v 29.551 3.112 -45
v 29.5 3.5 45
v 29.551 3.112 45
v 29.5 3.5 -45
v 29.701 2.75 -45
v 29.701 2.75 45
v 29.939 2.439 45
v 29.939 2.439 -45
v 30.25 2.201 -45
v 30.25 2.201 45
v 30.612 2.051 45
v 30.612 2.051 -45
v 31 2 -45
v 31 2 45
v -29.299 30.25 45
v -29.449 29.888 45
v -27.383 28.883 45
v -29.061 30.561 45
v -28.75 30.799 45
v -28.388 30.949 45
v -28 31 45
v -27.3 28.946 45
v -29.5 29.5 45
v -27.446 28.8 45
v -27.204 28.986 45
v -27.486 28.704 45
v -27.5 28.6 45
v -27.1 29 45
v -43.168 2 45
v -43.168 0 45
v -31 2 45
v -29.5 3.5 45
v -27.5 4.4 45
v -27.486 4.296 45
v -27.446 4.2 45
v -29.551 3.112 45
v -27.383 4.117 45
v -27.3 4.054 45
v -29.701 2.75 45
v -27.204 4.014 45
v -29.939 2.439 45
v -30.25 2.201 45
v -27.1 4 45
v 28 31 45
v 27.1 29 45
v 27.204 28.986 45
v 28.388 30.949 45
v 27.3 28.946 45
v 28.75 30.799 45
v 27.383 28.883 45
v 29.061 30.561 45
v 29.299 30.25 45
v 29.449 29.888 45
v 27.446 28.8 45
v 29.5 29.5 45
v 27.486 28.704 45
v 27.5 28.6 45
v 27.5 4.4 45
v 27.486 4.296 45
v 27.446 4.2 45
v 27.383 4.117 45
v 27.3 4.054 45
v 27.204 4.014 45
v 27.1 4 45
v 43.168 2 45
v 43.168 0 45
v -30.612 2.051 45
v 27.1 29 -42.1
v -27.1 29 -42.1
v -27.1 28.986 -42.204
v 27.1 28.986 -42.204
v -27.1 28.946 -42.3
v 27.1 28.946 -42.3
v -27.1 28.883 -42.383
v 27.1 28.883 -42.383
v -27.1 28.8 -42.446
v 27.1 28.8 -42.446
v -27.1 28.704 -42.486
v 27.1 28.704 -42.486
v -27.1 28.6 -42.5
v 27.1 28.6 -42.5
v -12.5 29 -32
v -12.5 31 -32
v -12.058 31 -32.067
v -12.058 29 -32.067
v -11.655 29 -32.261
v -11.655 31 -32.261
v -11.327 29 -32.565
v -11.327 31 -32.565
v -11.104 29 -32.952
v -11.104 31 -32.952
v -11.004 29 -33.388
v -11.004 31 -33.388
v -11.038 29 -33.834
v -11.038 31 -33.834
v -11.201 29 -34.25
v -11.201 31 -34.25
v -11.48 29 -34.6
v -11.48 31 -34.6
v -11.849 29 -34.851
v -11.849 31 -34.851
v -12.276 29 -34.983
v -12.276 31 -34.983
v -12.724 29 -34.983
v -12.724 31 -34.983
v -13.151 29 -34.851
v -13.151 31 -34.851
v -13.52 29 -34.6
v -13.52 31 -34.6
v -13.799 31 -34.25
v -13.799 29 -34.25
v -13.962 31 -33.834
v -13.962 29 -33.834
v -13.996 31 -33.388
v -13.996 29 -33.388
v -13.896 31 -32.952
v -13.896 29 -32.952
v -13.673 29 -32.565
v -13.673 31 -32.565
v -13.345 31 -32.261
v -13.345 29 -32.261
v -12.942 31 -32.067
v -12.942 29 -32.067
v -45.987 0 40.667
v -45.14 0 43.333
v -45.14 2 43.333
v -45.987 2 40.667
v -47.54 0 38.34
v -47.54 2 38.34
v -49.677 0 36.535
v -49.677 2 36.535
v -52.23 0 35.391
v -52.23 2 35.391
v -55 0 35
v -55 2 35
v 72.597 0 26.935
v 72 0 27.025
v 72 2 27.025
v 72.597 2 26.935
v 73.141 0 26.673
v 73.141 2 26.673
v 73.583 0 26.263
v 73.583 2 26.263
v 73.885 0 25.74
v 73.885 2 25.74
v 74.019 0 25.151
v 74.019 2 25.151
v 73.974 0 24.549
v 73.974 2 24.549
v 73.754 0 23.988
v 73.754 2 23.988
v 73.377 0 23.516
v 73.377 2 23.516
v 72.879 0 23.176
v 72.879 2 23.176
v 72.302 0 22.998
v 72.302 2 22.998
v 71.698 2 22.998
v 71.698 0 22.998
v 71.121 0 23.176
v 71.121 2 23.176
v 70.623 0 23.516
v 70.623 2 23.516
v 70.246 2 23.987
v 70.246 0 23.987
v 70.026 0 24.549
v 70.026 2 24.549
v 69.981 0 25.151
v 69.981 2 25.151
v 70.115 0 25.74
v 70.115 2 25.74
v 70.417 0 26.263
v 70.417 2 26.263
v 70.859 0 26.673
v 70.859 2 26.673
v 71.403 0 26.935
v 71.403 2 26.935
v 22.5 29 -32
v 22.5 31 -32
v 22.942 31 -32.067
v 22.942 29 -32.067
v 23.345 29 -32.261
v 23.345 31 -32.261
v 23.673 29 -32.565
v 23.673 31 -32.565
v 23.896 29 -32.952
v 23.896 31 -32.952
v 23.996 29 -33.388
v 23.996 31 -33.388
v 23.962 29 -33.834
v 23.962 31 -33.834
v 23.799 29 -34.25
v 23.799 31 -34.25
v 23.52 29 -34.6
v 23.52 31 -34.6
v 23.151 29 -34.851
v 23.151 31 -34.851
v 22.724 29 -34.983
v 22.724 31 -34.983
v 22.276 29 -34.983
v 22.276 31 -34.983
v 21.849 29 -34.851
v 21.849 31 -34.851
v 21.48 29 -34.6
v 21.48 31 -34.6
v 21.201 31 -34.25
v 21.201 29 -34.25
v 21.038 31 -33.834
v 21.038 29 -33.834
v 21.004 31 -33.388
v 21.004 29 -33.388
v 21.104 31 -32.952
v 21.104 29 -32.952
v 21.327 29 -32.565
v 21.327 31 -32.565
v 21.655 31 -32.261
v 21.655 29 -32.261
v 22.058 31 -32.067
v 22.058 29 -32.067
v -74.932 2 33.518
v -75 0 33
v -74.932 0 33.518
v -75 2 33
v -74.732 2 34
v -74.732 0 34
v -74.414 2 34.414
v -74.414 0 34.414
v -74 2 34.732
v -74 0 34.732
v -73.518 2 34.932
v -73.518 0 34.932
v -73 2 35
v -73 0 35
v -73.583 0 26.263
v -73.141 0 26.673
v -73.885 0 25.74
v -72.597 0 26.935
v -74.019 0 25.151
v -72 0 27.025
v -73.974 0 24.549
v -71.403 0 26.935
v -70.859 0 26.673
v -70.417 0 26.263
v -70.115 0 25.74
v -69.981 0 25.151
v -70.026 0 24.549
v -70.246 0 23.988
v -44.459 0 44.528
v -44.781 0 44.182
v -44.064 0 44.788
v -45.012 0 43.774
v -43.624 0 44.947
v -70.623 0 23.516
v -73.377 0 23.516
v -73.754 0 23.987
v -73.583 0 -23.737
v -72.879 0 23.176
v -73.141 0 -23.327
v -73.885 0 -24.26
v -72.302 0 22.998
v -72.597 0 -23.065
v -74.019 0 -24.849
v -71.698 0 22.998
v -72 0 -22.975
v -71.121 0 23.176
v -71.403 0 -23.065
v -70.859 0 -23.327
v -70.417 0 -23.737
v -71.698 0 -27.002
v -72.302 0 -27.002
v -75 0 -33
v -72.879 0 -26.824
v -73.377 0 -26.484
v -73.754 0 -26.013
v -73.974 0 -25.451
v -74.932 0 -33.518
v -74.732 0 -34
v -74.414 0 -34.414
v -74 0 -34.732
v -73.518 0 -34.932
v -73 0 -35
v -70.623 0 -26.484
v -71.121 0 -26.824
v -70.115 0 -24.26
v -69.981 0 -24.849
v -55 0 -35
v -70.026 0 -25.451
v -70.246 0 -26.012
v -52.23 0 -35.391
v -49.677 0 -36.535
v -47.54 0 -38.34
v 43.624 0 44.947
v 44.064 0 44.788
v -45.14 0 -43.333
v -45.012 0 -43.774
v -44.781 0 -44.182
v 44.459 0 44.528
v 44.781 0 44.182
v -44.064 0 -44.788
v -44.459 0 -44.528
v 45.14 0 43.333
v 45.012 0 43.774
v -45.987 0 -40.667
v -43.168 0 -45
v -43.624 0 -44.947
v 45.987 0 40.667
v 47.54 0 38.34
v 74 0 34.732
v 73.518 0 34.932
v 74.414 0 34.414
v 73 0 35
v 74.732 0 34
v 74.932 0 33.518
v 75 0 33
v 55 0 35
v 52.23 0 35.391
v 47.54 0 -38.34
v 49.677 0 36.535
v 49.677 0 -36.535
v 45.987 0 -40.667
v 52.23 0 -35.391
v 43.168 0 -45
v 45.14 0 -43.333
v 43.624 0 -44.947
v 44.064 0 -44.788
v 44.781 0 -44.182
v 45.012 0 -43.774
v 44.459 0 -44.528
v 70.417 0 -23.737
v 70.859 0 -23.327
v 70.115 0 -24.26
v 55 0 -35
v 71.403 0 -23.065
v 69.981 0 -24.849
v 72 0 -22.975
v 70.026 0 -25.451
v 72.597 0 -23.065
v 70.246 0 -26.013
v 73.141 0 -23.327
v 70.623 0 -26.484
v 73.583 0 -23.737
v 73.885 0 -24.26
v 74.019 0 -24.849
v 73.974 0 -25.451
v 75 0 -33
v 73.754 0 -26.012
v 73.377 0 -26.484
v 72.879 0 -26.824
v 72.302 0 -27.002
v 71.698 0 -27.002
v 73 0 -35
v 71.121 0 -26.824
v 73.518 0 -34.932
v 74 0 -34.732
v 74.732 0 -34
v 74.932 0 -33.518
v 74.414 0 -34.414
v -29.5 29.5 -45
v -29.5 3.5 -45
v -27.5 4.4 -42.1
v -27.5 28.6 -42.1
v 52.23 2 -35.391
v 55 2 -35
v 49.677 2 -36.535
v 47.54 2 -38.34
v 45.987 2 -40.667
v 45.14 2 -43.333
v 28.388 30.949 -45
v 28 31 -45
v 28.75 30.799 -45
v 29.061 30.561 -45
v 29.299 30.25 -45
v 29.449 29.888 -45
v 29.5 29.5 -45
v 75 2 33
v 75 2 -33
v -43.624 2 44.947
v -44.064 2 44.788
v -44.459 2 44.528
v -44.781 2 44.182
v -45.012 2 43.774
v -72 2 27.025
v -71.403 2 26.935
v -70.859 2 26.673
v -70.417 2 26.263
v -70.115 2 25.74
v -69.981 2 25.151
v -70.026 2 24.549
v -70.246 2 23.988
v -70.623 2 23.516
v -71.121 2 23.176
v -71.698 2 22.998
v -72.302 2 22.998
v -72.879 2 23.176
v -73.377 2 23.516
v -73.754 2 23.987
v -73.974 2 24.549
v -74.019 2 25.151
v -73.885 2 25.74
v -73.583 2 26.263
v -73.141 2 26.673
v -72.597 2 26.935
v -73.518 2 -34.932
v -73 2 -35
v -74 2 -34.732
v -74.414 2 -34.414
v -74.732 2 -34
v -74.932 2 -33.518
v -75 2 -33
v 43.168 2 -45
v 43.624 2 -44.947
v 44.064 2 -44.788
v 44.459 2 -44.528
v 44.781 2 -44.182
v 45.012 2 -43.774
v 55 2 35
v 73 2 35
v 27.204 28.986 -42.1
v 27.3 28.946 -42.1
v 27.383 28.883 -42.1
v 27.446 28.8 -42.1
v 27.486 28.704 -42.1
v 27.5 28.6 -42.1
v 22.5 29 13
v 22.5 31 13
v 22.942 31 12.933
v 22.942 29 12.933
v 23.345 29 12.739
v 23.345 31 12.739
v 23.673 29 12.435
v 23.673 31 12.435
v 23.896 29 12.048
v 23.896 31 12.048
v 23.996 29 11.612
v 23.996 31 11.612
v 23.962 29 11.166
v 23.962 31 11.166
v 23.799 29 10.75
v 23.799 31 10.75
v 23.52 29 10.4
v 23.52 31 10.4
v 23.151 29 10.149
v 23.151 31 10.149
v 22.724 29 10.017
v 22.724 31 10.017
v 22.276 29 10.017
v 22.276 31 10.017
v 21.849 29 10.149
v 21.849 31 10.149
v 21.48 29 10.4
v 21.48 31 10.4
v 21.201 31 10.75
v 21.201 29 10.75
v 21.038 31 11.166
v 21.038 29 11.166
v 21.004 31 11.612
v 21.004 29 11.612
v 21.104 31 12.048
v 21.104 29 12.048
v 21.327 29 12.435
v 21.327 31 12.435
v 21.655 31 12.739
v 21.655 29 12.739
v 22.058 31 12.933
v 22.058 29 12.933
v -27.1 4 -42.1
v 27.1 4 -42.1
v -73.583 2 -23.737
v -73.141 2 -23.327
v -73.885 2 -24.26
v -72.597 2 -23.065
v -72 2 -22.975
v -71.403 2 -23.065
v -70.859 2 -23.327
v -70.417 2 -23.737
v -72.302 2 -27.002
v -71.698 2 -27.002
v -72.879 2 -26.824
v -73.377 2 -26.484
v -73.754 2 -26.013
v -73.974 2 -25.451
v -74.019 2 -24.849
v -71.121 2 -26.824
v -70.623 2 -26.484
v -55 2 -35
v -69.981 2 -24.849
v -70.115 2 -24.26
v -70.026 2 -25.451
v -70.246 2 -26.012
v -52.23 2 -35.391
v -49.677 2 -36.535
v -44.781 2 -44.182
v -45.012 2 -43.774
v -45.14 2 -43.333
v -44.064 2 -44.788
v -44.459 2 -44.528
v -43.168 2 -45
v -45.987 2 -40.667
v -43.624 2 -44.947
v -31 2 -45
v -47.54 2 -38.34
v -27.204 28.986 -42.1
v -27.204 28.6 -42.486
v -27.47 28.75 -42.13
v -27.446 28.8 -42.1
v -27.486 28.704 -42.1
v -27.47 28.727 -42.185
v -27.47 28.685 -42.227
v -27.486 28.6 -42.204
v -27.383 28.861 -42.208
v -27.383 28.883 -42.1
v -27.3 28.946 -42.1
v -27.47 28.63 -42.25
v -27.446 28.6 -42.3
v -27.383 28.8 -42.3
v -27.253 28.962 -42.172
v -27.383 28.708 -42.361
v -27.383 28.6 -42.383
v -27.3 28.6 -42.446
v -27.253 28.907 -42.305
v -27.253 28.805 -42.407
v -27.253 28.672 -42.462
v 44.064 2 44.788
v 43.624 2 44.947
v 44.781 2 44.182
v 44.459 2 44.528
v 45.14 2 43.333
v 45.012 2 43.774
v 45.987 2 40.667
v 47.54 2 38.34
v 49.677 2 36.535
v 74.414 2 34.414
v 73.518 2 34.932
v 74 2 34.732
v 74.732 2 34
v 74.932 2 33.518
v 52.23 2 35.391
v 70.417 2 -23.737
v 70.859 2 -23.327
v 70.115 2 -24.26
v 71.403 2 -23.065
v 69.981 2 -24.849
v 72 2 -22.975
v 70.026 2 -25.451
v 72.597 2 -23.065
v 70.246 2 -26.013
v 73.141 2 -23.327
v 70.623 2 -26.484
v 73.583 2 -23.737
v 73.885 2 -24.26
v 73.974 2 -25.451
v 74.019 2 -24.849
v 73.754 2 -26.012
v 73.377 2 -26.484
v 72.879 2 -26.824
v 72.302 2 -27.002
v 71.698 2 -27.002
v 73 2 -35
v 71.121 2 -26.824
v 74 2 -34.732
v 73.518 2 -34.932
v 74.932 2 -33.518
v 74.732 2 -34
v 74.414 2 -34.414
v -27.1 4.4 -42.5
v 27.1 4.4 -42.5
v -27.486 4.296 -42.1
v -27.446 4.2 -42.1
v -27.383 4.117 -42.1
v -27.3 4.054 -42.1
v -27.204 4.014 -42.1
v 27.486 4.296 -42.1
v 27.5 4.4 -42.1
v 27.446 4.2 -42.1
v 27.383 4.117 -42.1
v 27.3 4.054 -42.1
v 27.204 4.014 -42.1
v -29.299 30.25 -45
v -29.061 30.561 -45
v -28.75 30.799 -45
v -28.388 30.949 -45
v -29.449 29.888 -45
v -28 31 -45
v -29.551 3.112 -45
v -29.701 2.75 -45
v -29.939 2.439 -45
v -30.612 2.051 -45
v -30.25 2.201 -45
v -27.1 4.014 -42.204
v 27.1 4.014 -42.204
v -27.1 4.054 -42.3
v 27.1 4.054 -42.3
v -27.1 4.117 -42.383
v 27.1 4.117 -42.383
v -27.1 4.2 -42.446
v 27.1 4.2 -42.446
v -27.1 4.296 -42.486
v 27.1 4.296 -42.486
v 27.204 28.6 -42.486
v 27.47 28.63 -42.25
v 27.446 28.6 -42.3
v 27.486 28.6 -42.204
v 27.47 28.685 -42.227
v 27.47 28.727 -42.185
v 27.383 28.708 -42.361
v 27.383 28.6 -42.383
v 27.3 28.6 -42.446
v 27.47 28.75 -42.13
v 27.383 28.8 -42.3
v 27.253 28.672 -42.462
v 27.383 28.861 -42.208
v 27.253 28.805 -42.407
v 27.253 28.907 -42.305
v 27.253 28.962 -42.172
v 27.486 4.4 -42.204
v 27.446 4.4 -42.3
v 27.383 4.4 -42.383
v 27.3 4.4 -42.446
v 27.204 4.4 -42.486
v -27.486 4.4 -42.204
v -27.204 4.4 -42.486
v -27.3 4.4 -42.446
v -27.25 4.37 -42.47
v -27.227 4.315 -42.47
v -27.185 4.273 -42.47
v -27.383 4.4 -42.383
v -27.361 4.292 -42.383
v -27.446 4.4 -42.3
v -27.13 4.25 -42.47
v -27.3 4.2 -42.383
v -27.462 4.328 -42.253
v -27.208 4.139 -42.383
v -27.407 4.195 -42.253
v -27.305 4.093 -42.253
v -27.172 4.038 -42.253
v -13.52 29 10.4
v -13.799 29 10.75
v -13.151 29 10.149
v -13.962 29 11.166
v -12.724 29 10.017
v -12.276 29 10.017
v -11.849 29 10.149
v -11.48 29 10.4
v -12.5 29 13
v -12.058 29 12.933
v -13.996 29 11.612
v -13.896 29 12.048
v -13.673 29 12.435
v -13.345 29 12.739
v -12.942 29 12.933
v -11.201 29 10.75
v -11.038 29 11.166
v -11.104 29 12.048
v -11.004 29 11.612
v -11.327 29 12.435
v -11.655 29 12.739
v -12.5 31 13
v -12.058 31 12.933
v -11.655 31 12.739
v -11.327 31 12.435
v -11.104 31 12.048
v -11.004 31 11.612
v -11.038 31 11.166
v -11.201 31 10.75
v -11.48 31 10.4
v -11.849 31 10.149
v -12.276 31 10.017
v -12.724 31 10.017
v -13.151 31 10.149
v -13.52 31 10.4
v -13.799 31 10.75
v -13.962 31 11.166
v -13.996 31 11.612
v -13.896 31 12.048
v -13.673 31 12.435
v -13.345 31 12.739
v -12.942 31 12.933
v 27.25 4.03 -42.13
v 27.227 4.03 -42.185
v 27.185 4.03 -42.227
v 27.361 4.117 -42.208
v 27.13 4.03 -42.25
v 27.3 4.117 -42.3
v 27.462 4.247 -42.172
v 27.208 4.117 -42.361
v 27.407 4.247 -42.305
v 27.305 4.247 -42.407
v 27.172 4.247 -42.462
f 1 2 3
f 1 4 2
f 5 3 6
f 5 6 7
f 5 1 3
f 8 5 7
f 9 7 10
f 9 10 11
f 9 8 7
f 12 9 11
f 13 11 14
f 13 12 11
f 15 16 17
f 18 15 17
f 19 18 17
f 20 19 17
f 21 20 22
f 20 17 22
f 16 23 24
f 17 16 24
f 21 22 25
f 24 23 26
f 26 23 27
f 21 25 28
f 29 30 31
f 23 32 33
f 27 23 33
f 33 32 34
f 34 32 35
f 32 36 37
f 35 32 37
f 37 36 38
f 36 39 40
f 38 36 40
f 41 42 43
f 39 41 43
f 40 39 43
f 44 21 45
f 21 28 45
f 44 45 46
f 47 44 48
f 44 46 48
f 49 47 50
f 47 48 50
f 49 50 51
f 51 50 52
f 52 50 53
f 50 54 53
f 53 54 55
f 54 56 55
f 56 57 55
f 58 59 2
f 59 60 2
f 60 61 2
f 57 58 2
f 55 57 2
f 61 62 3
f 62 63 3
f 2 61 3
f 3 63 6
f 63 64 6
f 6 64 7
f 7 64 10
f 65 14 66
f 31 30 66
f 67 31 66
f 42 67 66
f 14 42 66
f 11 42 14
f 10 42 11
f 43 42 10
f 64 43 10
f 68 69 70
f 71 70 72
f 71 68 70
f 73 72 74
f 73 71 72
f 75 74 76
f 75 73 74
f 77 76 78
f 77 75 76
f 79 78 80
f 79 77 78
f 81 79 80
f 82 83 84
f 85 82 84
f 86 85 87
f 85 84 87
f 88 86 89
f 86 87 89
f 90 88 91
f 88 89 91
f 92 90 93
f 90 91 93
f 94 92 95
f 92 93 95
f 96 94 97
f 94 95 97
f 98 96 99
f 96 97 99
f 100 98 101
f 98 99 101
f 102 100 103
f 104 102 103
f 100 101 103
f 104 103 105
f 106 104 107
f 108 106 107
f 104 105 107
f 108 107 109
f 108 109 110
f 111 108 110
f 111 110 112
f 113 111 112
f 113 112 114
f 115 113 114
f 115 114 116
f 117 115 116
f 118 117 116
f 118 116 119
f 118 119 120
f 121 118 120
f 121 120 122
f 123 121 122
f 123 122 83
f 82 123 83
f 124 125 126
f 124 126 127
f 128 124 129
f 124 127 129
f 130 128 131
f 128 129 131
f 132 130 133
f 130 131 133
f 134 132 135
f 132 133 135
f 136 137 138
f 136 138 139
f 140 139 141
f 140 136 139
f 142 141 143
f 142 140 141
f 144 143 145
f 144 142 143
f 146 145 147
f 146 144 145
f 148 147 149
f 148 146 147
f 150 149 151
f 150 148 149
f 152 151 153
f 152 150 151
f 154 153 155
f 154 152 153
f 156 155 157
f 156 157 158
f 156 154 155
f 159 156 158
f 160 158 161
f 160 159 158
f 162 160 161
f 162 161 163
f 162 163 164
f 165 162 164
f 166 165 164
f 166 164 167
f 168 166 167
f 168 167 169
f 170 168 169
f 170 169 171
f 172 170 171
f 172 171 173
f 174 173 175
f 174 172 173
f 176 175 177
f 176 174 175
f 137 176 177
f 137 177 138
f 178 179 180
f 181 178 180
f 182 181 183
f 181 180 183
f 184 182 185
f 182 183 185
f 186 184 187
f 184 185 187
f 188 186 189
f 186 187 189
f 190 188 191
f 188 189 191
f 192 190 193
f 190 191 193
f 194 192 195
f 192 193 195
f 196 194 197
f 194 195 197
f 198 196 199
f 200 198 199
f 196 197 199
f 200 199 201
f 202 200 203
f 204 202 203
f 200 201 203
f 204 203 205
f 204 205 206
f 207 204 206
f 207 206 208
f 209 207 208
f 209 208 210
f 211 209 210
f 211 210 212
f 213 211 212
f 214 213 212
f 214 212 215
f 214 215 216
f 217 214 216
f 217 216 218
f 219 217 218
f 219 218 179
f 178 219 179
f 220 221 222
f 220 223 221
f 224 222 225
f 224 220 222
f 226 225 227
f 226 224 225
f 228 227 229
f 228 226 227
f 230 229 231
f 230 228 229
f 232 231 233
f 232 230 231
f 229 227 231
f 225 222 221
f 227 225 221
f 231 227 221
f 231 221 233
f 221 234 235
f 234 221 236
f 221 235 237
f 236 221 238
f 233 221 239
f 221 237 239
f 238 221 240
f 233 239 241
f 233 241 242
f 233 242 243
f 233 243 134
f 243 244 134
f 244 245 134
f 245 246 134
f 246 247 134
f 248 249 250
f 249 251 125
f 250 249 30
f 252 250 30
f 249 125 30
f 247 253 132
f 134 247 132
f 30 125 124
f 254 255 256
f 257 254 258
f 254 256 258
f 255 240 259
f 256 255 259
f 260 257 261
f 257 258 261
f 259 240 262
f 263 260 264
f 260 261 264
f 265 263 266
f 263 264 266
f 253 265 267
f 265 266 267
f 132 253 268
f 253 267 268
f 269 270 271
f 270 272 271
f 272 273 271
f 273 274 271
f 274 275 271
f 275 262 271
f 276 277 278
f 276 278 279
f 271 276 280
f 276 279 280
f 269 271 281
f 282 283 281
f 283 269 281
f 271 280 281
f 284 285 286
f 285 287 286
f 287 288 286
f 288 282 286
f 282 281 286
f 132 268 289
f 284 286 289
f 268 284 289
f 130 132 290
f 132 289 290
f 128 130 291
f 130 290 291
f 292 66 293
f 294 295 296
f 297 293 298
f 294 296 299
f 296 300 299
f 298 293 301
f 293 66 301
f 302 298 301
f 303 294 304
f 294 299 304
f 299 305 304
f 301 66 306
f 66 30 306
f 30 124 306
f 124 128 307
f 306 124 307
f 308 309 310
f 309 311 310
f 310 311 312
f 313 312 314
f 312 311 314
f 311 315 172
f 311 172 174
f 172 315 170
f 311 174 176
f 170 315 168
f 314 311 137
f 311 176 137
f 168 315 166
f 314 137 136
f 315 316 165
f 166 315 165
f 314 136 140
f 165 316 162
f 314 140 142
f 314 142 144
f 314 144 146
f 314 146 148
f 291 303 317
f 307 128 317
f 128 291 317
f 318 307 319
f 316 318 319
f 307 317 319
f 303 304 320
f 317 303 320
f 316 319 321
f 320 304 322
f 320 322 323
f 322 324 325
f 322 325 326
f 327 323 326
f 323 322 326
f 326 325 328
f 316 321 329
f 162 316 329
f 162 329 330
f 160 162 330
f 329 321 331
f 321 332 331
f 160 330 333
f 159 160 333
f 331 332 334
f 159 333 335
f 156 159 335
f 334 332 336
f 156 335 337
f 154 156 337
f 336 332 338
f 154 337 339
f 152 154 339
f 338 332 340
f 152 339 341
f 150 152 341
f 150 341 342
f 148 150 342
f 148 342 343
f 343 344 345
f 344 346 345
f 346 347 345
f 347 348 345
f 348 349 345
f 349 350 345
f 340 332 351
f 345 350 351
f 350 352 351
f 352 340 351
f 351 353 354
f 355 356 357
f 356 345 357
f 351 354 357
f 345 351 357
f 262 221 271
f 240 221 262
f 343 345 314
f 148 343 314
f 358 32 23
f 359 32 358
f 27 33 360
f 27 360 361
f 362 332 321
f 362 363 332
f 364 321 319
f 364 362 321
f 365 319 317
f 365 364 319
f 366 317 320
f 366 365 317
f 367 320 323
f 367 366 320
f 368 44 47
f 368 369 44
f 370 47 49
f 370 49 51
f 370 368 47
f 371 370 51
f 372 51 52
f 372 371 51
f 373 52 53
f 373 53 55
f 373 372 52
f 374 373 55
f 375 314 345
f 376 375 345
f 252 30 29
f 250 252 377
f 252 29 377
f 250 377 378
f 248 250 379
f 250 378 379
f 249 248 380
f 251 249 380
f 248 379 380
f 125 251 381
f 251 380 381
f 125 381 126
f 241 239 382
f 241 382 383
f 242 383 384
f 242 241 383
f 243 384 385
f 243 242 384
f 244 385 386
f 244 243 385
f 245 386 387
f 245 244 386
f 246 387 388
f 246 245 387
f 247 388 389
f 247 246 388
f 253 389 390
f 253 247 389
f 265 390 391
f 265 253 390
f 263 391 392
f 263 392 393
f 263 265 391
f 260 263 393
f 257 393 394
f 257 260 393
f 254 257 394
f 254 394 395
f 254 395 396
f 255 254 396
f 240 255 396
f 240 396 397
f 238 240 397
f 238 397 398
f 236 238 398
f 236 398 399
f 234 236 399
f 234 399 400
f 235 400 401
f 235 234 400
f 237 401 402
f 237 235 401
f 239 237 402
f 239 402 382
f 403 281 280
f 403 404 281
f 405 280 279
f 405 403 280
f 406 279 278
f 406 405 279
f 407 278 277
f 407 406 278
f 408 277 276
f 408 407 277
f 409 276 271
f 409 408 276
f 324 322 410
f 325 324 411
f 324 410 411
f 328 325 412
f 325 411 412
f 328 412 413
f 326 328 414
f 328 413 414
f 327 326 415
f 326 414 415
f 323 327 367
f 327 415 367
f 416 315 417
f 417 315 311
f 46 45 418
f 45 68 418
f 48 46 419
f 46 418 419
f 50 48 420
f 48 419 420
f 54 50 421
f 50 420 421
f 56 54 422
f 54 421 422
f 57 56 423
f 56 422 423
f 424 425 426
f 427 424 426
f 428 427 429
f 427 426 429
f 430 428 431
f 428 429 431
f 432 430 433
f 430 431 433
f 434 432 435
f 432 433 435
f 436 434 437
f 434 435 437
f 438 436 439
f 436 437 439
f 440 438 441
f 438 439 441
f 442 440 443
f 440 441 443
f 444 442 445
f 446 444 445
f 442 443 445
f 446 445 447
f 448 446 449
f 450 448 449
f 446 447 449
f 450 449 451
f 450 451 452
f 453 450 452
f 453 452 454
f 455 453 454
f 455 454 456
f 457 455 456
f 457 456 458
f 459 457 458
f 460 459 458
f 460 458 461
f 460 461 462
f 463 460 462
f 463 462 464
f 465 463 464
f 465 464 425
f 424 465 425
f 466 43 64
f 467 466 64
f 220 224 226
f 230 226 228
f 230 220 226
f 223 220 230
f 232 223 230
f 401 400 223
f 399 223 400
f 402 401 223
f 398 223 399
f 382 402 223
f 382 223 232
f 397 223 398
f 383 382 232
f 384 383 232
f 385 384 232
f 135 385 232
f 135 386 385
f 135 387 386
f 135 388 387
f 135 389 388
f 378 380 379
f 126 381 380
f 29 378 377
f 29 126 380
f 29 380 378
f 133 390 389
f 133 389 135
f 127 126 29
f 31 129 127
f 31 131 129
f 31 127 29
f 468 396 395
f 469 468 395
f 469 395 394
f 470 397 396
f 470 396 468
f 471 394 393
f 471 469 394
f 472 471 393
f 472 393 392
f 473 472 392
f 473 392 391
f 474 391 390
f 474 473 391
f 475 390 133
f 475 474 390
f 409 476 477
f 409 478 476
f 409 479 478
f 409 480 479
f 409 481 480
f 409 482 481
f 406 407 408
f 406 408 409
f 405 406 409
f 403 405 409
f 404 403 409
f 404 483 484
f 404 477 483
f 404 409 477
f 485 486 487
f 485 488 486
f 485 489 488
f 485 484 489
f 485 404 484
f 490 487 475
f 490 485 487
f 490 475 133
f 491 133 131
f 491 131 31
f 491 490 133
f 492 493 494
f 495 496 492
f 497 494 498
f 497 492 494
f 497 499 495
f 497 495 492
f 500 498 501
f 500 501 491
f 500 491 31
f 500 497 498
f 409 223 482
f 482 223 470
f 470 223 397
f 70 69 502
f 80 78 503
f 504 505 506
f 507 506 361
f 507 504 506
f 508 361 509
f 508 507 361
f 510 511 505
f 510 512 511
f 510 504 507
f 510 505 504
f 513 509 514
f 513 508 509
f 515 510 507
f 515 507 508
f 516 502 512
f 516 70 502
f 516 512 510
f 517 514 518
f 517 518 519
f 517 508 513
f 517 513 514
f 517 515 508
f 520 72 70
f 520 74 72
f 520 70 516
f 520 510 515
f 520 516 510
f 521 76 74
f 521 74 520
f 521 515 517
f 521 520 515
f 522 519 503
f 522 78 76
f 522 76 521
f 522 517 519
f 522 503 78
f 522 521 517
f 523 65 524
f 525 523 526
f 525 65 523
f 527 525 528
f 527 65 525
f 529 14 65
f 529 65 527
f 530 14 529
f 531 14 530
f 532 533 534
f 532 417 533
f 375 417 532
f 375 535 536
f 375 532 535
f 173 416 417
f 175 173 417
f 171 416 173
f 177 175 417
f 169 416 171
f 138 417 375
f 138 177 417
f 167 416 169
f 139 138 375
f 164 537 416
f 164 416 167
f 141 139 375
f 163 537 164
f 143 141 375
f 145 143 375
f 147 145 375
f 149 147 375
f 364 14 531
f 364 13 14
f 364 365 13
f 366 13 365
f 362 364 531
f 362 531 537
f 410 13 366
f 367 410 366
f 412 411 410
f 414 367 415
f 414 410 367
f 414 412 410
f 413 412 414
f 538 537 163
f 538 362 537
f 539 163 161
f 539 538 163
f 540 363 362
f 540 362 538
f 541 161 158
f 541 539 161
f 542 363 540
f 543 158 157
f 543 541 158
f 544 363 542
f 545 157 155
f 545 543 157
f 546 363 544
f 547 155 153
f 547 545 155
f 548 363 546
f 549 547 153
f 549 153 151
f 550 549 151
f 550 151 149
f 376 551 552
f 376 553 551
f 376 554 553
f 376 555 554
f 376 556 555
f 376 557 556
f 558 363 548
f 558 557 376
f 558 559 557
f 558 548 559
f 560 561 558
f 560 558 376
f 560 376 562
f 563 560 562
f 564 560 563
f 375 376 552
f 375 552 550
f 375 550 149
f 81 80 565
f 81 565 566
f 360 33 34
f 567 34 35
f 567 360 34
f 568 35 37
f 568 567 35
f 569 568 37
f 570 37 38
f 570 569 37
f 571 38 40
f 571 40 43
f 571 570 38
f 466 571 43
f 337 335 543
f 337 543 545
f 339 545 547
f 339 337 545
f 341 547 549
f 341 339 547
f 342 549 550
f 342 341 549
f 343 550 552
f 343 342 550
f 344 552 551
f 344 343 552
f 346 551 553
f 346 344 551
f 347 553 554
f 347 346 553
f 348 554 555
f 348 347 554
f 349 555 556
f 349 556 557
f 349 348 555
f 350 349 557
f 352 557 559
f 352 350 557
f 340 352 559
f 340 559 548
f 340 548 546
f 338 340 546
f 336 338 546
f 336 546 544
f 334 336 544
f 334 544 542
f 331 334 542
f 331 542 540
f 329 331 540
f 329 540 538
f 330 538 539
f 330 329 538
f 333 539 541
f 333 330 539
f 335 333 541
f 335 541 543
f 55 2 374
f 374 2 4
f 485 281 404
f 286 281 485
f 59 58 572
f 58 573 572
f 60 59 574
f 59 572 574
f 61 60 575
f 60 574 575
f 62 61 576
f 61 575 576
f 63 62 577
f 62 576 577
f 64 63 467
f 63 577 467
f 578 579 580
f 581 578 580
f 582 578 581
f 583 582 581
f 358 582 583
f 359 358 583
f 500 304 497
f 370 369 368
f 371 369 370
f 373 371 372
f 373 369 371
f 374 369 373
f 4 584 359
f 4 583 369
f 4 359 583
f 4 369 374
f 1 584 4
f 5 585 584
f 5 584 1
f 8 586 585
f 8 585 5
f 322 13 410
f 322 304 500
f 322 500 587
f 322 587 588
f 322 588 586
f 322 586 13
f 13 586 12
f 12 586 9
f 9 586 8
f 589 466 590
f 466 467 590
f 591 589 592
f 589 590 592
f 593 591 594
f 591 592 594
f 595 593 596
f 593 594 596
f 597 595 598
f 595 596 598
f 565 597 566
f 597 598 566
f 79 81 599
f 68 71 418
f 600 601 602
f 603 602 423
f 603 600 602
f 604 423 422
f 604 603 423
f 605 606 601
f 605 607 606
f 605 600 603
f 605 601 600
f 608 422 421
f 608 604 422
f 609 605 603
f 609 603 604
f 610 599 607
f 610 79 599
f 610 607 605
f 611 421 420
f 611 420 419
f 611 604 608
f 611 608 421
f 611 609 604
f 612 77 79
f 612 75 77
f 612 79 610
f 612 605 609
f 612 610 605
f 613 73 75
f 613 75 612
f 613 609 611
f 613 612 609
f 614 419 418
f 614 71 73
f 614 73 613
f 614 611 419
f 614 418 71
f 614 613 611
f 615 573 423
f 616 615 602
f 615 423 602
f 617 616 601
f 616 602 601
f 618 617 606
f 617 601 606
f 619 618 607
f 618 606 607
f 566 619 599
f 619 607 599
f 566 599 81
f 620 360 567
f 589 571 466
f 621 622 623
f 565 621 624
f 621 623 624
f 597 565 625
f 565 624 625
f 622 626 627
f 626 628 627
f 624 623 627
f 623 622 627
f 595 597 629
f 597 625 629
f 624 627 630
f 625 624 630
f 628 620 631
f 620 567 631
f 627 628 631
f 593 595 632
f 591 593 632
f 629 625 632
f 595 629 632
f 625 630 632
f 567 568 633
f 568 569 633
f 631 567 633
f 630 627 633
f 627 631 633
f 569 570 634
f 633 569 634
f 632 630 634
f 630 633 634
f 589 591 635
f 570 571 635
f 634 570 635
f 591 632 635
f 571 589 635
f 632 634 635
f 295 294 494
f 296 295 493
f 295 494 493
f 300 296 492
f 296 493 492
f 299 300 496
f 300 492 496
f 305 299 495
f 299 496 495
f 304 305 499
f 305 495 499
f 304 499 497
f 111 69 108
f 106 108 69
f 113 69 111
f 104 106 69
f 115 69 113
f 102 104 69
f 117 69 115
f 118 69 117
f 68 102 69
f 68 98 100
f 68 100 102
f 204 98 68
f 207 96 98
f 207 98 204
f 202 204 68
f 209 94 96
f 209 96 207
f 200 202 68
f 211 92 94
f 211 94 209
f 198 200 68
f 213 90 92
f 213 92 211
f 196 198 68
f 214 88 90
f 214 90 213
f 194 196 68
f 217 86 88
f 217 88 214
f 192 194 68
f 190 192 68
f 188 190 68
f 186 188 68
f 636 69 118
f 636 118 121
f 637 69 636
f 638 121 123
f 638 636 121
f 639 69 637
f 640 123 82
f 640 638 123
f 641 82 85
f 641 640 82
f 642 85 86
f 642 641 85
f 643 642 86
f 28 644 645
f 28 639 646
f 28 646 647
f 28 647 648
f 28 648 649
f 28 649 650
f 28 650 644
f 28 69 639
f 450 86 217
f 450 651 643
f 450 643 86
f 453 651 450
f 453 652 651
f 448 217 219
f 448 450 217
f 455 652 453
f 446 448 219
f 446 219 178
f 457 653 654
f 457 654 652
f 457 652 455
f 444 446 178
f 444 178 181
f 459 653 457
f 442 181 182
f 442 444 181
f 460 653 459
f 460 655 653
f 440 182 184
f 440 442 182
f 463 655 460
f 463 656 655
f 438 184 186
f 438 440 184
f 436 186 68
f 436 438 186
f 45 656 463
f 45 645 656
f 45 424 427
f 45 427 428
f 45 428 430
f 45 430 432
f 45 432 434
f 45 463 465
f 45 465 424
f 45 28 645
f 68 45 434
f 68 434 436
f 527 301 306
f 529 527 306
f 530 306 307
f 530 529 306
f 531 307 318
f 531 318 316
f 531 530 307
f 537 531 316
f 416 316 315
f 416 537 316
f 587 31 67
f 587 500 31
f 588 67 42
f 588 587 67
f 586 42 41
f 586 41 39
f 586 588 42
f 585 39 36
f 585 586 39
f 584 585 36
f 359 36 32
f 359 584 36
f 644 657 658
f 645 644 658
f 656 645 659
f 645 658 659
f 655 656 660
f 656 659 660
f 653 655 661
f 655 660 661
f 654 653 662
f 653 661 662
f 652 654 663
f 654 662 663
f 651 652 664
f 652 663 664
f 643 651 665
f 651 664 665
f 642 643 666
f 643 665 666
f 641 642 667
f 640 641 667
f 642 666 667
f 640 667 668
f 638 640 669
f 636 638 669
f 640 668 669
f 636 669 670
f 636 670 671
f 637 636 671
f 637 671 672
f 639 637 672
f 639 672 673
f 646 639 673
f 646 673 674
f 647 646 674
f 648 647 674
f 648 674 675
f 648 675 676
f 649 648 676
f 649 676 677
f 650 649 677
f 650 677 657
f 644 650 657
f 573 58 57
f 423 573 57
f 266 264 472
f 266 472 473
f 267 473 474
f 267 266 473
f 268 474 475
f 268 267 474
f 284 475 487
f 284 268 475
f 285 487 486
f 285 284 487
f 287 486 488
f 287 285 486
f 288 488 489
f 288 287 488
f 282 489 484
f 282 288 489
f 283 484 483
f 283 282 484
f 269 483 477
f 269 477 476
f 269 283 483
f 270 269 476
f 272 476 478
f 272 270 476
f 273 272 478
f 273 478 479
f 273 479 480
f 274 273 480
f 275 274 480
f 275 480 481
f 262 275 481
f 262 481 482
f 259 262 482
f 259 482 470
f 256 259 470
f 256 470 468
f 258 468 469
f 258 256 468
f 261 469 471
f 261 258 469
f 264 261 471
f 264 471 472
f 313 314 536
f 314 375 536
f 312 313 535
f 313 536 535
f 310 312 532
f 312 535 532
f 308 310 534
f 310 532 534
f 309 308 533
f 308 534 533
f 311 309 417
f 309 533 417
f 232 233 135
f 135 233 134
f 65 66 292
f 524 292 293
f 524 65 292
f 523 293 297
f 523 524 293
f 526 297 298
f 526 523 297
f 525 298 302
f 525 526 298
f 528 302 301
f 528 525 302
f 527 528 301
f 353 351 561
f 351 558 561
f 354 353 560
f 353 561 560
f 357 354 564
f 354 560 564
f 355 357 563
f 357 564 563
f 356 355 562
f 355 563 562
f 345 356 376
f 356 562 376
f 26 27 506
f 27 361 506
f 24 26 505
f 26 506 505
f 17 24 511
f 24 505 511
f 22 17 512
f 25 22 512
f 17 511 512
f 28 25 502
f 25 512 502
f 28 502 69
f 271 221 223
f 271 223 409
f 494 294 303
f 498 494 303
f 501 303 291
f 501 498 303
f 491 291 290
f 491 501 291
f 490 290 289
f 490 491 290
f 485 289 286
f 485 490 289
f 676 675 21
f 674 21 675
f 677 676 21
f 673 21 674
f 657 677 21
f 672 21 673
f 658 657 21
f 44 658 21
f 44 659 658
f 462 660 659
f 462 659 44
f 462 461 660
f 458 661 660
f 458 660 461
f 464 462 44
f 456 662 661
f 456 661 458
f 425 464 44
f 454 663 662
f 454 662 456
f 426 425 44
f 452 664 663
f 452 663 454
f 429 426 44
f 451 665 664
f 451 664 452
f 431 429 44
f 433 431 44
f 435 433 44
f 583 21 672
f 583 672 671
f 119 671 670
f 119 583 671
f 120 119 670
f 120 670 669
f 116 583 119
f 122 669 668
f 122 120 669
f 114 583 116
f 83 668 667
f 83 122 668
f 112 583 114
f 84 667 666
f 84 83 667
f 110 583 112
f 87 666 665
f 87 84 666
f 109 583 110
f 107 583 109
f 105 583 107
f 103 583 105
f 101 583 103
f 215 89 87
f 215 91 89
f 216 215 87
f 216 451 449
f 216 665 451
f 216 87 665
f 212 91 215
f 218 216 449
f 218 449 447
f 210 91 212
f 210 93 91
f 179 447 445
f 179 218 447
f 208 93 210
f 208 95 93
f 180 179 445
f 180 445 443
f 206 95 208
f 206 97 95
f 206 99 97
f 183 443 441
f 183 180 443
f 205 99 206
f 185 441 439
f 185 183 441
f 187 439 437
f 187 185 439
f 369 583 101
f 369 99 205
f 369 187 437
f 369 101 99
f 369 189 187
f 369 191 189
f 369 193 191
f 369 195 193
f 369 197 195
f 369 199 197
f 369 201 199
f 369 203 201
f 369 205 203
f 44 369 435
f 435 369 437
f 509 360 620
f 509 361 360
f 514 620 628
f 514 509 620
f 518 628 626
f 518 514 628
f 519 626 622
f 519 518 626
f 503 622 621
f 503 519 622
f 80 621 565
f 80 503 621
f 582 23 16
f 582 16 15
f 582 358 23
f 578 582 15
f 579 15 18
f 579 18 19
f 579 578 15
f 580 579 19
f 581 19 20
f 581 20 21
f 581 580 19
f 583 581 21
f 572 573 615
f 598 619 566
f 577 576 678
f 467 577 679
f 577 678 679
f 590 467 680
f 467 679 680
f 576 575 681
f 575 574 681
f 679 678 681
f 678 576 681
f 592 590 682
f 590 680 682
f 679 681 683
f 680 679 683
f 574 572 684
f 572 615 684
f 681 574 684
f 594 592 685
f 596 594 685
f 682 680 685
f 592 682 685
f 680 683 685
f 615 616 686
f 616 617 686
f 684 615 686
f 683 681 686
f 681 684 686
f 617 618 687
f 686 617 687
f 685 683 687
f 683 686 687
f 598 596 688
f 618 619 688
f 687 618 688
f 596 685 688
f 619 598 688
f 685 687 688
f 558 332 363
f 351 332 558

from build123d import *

# Parameters (mm, degrees)
SKETCH1_W           = 90
SKETCH1_H           = 70
SKETCH1_W_2         = 30
SKETCH1_R           = 2.025
SKETCH1_H_2         = 10
BOSS_EXTRUDE1_DEPTH = 2
SKETCH2_W           = 59
SKETCH2_H           = 90
BOSS_EXTRUDE2_DEPTH = 29
SKETCH4_W           = 55
SKETCH4_H           = 25
CUT_EXTRUDE1_DEPTH  = 87.5
FILLET1_R           = 1.5
FILLET2_R           = 0.4
FILLET3_R           = 10
FILLET7_R           = 2
SKETCH7_R           = 1.5
CUT_EXTRUDE2_DEPTH  = 5


with BuildPart() as part:
    # Sketch1 → Boss-Extrude1 (new body)
    # profile 1 of 5: a face of its own
    with BuildSketch(Plane(origin=(0, 0, 0), x_dir=(1, 0, 0), z_dir=(0, 1, 0))):
        Rectangle(SKETCH1_W, SKETCH1_H)
    # profile 2 of 5: a face of its own
    with BuildSketch(Plane(origin=(0, 0, 0), x_dir=(1, 0, 0), z_dir=(0, 1, 0))):
        with Locations((-60, 0)):
            Rectangle(SKETCH1_W_2, SKETCH1_H)
        with Locations(Location((-72, -25, 0), (0, 0, 270))):
            Circle(SKETCH1_R, mode=Mode.SUBTRACT)
        with Locations(Location((-72, 25, 0), (0, 0, 270))):
            Circle(SKETCH1_R, mode=Mode.SUBTRACT)
    # profile 3 of 5: a face of its own
    with BuildSketch(Plane(origin=(0, 0, 0), x_dir=(1, 0, 0), z_dir=(0, 1, 0))):
        with Locations((60, 0)):
            Rectangle(SKETCH1_W_2, SKETCH1_H)
        with Locations(Location((72, -25, 0), (0, 0, 270))):
            Circle(SKETCH1_R, mode=Mode.SUBTRACT)
        with Locations(Location((72, 25, 0), (0, 0, 270))):
            Circle(SKETCH1_R, mode=Mode.SUBTRACT)
    # profile 4 of 5: a face of its own
    with BuildSketch(Plane(origin=(0, 0, 0), x_dir=(1, 0, 0), z_dir=(0, 1, 0))):
        with Locations((0, -40)):
            Rectangle(SKETCH1_W, SKETCH1_H_2)
    # profile 5 of 5: a face of its own
    with BuildSketch(Plane(origin=(0, 0, 0), x_dir=(1, 0, 0), z_dir=(0, 1, 0))):
        with Locations((0, 40)):
            Rectangle(SKETCH1_W, SKETCH1_H_2)
    extrude(amount=BOSS_EXTRUDE1_DEPTH)

    # Sketch2 → Boss-Extrude2 (add)
    with BuildSketch(Plane(origin=(0, 2, 0), x_dir=(1, 0, 0), z_dir=(0, 1, 0))):
        Rectangle(SKETCH2_W, SKETCH2_H)
    extrude(amount=BOSS_EXTRUDE2_DEPTH)

    # Sketch4 → Cut-Extrude1 (cut)
    with BuildSketch(Plane.XY.offset(45)):
        with Locations((0, 16.5)):
            Rectangle(SKETCH4_W, SKETCH4_H)
    extrude(amount=-CUT_EXTRUDE1_DEPTH, mode=Mode.SUBTRACT)

    # Fillet1
    fillet1_edges = [part.edges().sort_by_distance(p)[0] for p in [
        (-29.5, 2, 0),
        (29.5, 2, 0),
        (-29.5, 31, 0),
        (29.5, 31, 0),
    ]]
    fillet(fillet1_edges, radius=FILLET1_R)

    # Fillet2
    fillet2_edges = [part.edges().sort_by_distance(p)[0] for p in [
        (-27.5, 4, 1.25),
        (0, 29, -42.5),
        (-27.5, 29, 1.25),
        (27.5, 16.5, -42.5),
        (27.5, 29, 1.25),
        (27.5, 4, 1.25),
        (-27.5, 16.5, -42.5),
        (0, 4, -42.5),
    ]]
    fillet(fillet2_edges, radius=FILLET2_R)

    # Fillet3
    fillet3_edges = [part.edges().sort_by_distance(p)[0] for p in [
        (-45, 1, 35),
        (-45, 1, -35),
        (45, 1, -35),
        (45, 1, 35),
    ]]
    fillet(fillet3_edges, radius=FILLET3_R - 0.0001)  # a hair under: the kernel refuses the full size

    # Fillet7
    fillet7_edges = [part.edges().sort_by_distance(p)[0] for p in [
        (-45, 1, -45),
        (45, 1, -45),
        (75, 1, -35),
        (75, 1, 35),
        (45, 1, 45),
        (-45, 1, 45),
        (-75, 1, 35),
        (-75, 1, -35),
    ]]
    fillet(fillet7_edges, radius=FILLET7_R)

    # Sketch7 → Cut-Extrude2 (cut)
    with BuildSketch(Plane(origin=(0, 31, 0), x_dir=(1, 0, 0), z_dir=(0, 1, 0))):
        with Locations(Location((-12.5, 33.5, 0), (0, 0, 270))):
            Circle(SKETCH7_R)
        with Locations(Location((22.5, 33.5, 0), (0, 0, 270))):
            Circle(SKETCH7_R)
        with Locations(Location((22.5, -11.5, 0), (0, 0, 270))):
            Circle(SKETCH7_R)
        with Locations(Location((-12.5, -11.5, 0), (0, 0, 270))):
            Circle(SKETCH7_R)
    extrude(amount=-CUT_EXTRUDE2_DEPTH, mode=Mode.SUBTRACT)


solid = part.part
